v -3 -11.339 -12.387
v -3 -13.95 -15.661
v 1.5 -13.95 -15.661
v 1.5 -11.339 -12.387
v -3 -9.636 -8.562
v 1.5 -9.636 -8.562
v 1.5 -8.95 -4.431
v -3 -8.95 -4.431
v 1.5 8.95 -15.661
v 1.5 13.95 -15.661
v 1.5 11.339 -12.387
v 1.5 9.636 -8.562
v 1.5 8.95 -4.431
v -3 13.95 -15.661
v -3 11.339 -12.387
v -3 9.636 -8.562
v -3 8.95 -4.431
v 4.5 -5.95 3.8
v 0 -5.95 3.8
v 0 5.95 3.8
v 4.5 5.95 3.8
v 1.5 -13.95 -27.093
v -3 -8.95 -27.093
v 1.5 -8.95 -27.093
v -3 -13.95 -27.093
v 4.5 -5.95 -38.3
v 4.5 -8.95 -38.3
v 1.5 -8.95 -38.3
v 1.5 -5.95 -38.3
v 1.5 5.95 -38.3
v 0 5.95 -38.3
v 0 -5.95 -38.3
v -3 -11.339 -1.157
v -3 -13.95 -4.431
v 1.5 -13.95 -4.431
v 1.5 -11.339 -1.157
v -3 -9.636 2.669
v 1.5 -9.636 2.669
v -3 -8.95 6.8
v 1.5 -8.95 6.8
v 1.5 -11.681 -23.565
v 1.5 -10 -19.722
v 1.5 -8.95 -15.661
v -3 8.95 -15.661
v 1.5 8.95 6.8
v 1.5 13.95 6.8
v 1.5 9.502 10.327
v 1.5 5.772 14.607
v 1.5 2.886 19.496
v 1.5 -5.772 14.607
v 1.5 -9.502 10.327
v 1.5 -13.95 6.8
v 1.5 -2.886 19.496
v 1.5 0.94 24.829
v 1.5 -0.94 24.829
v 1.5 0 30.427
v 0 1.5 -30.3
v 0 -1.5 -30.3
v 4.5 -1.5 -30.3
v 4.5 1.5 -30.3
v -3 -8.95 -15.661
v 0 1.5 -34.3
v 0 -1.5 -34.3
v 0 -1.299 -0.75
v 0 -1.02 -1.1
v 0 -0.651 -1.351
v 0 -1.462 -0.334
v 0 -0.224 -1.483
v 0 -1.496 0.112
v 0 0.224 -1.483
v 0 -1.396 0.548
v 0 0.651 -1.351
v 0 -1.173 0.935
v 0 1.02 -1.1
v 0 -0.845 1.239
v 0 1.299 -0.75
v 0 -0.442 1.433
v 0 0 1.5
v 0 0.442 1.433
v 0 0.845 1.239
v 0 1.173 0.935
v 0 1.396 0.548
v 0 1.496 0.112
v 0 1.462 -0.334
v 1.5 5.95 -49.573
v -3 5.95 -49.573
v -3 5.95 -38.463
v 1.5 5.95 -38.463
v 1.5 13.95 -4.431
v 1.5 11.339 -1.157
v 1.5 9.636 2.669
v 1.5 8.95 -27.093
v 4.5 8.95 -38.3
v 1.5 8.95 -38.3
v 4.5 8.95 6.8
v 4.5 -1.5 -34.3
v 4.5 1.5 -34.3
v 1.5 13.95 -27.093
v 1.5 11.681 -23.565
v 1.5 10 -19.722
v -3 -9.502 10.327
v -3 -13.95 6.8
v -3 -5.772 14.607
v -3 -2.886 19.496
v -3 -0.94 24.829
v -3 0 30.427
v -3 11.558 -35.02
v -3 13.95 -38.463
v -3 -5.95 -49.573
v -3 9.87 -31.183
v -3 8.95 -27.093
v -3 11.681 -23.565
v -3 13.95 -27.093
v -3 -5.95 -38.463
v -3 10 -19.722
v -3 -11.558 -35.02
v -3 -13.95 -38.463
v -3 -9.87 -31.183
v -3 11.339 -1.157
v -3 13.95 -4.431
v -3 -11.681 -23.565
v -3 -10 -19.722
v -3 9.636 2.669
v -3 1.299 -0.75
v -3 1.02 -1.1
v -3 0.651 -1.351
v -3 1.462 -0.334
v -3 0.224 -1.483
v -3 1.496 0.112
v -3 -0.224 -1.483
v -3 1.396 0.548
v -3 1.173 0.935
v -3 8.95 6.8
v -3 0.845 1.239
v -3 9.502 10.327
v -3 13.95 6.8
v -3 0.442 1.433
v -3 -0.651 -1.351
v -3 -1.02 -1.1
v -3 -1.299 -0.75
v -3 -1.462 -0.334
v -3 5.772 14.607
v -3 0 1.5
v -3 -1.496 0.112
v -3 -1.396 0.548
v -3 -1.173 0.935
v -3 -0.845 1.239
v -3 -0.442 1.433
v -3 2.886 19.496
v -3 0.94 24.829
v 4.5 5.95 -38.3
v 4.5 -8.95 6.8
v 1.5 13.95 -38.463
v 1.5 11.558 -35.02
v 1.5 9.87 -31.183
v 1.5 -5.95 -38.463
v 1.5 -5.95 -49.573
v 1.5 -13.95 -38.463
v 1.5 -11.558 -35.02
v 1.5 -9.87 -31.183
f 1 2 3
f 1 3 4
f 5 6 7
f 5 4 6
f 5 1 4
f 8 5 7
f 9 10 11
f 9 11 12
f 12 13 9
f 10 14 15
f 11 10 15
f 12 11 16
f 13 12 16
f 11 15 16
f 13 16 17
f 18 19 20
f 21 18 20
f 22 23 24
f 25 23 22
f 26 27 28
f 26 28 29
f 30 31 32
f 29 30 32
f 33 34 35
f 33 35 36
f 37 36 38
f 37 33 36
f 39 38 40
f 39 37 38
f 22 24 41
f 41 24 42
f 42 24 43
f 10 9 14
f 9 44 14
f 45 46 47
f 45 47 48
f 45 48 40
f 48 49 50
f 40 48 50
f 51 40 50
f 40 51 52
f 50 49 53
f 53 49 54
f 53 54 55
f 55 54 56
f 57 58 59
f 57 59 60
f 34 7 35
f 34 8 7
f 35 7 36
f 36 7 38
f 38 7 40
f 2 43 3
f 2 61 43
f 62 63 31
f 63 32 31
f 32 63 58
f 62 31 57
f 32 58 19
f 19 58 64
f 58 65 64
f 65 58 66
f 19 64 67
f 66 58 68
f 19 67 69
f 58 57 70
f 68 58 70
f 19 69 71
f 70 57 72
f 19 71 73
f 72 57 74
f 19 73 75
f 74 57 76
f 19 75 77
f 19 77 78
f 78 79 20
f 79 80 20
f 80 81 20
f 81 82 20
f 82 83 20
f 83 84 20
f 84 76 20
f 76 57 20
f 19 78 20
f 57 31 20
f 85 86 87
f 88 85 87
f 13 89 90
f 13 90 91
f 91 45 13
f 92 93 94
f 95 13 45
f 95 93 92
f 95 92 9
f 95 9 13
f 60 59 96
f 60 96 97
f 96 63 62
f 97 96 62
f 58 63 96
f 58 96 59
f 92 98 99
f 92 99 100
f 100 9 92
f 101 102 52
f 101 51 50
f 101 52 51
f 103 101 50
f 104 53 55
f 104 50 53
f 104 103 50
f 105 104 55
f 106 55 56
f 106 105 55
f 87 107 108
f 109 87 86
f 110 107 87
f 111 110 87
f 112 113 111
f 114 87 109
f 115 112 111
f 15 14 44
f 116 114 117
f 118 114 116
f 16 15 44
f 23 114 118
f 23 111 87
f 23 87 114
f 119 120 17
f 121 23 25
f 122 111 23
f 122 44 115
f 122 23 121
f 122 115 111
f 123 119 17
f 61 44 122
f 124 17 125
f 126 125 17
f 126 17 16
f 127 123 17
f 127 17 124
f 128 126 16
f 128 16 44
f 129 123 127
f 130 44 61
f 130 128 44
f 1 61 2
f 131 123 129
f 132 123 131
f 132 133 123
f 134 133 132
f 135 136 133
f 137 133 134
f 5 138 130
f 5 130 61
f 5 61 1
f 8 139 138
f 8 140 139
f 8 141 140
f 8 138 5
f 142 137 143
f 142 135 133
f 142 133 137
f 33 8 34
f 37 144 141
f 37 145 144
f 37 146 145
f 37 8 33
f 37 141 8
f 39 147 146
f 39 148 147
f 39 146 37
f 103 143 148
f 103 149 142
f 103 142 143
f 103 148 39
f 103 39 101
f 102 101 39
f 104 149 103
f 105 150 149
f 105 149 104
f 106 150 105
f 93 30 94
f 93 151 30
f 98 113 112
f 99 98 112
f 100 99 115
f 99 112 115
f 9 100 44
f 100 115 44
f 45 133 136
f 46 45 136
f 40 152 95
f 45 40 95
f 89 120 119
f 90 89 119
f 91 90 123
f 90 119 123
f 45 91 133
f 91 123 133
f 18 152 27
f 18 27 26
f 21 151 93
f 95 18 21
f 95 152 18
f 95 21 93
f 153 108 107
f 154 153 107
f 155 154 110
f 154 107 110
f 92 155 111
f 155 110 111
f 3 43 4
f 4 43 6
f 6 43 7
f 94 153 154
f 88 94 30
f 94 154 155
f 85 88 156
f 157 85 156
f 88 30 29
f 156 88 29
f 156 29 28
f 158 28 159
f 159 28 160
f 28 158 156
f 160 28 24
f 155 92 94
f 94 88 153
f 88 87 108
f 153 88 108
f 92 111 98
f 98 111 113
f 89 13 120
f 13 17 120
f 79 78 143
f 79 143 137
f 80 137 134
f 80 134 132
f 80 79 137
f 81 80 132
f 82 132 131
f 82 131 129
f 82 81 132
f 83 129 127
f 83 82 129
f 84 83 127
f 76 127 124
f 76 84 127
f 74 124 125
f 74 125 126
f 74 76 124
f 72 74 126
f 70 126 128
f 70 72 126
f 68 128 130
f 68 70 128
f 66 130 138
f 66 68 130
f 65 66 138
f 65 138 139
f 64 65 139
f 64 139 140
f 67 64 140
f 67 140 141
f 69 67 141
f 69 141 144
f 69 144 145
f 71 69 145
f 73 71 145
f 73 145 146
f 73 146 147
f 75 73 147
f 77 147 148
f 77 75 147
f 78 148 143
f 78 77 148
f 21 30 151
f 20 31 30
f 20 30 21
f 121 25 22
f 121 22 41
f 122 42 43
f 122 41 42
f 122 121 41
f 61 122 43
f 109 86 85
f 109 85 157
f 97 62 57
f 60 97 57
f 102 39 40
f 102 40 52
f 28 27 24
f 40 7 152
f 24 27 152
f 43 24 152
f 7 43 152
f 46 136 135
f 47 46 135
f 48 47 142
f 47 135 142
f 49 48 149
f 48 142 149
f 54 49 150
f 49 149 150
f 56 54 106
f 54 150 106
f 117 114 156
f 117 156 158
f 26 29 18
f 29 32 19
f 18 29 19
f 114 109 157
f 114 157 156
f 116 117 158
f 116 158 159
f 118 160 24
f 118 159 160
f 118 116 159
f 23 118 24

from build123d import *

# Parameters (mm, degrees)
SKETCH1_W               = 3
SKETCH1_H               = 42.1
SKETCH1_H_2             = 4
BOSS_EXTRUDE1_DEPTH     = 12
SKETCH3_W               = 45.1
SKETCH3_H               = 17.9
SKETCH3_R               = 1.5
BOSS_EXTRUDE2_DEPTH     = 3
SKETCH5_W               = 17.9
SKETCH5_H               = 45.1
BOSS_EXTRUDE4_DEPTH     = 4.5
CUT_EXTRUDE4_DEPTH      = 54.638254019
CUT_EXTRUDE5_DEPTH      = 54.638254019
CUT_EXTRUDE5_DEPTH_BACK = 7.5
SKETCH7_W               = 17.9
SKETCH7_H               = 45.1


with BuildPart() as part:
    # Sketch1 → Boss-Extrude1 (new body)
    with BuildSketch(Plane.YZ):
        Polygon((-5.95, 3.8), (5.95, 3.8), (8.95, 3.8), (8.95, 6.8), (-8.95, 6.8), (-8.95, 3.8), align=None)
        with Locations((-7.45, -17.25)):
            Rectangle(SKETCH1_W, SKETCH1_H)
        with Locations((7.45, -17.25)):
            Rectangle(SKETCH1_W, SKETCH1_H)
        with Locations((0, -32.3)):
            Rectangle(SKETCH1_W, SKETCH1_H_2)
    extrude(amount=BOSS_EXTRUDE1_DEPTH)

    # Sketch3 → Boss-Extrude2 (add)
    with BuildSketch(Plane.ZY):
        with Locations((-15.75, 0)):
            Rectangle(SKETCH3_W, SKETCH3_H)
        Circle(SKETCH3_R, mode=Mode.SUBTRACT)
    extrude(amount=BOSS_EXTRUDE2_DEPTH)

    # Sketch5 → Boss-Extrude4 (add)
    with BuildSketch(Plane(origin=(-3, 0, 0), x_dir=(0, -1, 0), z_dir=(-1, 0, 0))):
        Polygon((-13.95, 21.583539772), (-13.95, -49.572772711), (13.95, -49.572772711), (13.95, 20.927227289), (13.95, 30.427227289), (-13.95, 30.427227289), align=None)
        with Locations((0, -15.75)):
            Rectangle(SKETCH5_W, SKETCH5_H, mode=Mode.SUBTRACT)
    extrude(amount=-BOSS_EXTRUDE4_DEPTH)

    # Sketch6 → Cut-Extrude4 (cut, symmetric)
    with BuildSketch(Plane(origin=(-3, 0, 0), x_dir=(0, -1, 0), z_dir=(-1, 0, 0))):
        with BuildLine():
            Line((-8.95, -4.430558852), (-13.95, -4.430558852))
            ThreePointArc((-13.95, -4.430558852), (-10.365862707, 0.702047669), (-8.95, 6.8))
            Line((-8.95, 6.8), (-13.95, 6.8))
            ThreePointArc((-13.95, 6.8), (-4.216827043, 16.985131712), (0, 30.427227289))
            Line((0, 30.427227289), (0, 38.207310194))
            Line((0, 38.207310194), (-27.495186948, 38.207310194))
            Line((-27.495186948, 38.207310194), (-27.495186948, -49.572772711))
            Line((-27.495186948, -49.572772711), (-5.95, -49.572772711))
            Line((-5.95, -49.572772711), (-5.95, -38.463062756))
            Line((-5.95, -38.463062756), (-13.95, -38.463062756))
            ThreePointArc((-13.95, -38.463062756), (-10.621066319, -33.1423359), (-8.95, -27.092586229))
            Line((-8.95, -27.092586229), (-13.95, -27.092586229))
            ThreePointArc((-13.95, -27.092586229), (-10.764093377, -21.676860063), (-8.95, -15.661117704))
            Line((-8.95, -15.661117704), (-13.95, -15.661117704))
            ThreePointArc((-13.95, -15.661117704), (-10.365862707, -10.528511183), (-8.95, -4.430558852))
        make_face()
    cut_extrude4 = extrude(amount=CUT_EXTRUDE4_DEPTH, both=True, mode=Mode.SUBTRACT)

    # Mirror1: Cut-Extrude4 across plane
    add(cut_extrude4.mirror(Plane.ZX), mode=Mode.SUBTRACT)

    # Sketch7 → Cut-Extrude5 (cut, two sides: drawn at the far end of the back side and taken through both)
    with BuildSketch(Plane.YZ.offset(12).offset(-CUT_EXTRUDE5_DEPTH_BACK)):
        with Locations((0, -15.75)):
            Rectangle(SKETCH7_W, SKETCH7_H)
    extrude(amount=CUT_EXTRUDE5_DEPTH + CUT_EXTRUDE5_DEPTH_BACK, mode=Mode.SUBTRACT)


solid = part.part
